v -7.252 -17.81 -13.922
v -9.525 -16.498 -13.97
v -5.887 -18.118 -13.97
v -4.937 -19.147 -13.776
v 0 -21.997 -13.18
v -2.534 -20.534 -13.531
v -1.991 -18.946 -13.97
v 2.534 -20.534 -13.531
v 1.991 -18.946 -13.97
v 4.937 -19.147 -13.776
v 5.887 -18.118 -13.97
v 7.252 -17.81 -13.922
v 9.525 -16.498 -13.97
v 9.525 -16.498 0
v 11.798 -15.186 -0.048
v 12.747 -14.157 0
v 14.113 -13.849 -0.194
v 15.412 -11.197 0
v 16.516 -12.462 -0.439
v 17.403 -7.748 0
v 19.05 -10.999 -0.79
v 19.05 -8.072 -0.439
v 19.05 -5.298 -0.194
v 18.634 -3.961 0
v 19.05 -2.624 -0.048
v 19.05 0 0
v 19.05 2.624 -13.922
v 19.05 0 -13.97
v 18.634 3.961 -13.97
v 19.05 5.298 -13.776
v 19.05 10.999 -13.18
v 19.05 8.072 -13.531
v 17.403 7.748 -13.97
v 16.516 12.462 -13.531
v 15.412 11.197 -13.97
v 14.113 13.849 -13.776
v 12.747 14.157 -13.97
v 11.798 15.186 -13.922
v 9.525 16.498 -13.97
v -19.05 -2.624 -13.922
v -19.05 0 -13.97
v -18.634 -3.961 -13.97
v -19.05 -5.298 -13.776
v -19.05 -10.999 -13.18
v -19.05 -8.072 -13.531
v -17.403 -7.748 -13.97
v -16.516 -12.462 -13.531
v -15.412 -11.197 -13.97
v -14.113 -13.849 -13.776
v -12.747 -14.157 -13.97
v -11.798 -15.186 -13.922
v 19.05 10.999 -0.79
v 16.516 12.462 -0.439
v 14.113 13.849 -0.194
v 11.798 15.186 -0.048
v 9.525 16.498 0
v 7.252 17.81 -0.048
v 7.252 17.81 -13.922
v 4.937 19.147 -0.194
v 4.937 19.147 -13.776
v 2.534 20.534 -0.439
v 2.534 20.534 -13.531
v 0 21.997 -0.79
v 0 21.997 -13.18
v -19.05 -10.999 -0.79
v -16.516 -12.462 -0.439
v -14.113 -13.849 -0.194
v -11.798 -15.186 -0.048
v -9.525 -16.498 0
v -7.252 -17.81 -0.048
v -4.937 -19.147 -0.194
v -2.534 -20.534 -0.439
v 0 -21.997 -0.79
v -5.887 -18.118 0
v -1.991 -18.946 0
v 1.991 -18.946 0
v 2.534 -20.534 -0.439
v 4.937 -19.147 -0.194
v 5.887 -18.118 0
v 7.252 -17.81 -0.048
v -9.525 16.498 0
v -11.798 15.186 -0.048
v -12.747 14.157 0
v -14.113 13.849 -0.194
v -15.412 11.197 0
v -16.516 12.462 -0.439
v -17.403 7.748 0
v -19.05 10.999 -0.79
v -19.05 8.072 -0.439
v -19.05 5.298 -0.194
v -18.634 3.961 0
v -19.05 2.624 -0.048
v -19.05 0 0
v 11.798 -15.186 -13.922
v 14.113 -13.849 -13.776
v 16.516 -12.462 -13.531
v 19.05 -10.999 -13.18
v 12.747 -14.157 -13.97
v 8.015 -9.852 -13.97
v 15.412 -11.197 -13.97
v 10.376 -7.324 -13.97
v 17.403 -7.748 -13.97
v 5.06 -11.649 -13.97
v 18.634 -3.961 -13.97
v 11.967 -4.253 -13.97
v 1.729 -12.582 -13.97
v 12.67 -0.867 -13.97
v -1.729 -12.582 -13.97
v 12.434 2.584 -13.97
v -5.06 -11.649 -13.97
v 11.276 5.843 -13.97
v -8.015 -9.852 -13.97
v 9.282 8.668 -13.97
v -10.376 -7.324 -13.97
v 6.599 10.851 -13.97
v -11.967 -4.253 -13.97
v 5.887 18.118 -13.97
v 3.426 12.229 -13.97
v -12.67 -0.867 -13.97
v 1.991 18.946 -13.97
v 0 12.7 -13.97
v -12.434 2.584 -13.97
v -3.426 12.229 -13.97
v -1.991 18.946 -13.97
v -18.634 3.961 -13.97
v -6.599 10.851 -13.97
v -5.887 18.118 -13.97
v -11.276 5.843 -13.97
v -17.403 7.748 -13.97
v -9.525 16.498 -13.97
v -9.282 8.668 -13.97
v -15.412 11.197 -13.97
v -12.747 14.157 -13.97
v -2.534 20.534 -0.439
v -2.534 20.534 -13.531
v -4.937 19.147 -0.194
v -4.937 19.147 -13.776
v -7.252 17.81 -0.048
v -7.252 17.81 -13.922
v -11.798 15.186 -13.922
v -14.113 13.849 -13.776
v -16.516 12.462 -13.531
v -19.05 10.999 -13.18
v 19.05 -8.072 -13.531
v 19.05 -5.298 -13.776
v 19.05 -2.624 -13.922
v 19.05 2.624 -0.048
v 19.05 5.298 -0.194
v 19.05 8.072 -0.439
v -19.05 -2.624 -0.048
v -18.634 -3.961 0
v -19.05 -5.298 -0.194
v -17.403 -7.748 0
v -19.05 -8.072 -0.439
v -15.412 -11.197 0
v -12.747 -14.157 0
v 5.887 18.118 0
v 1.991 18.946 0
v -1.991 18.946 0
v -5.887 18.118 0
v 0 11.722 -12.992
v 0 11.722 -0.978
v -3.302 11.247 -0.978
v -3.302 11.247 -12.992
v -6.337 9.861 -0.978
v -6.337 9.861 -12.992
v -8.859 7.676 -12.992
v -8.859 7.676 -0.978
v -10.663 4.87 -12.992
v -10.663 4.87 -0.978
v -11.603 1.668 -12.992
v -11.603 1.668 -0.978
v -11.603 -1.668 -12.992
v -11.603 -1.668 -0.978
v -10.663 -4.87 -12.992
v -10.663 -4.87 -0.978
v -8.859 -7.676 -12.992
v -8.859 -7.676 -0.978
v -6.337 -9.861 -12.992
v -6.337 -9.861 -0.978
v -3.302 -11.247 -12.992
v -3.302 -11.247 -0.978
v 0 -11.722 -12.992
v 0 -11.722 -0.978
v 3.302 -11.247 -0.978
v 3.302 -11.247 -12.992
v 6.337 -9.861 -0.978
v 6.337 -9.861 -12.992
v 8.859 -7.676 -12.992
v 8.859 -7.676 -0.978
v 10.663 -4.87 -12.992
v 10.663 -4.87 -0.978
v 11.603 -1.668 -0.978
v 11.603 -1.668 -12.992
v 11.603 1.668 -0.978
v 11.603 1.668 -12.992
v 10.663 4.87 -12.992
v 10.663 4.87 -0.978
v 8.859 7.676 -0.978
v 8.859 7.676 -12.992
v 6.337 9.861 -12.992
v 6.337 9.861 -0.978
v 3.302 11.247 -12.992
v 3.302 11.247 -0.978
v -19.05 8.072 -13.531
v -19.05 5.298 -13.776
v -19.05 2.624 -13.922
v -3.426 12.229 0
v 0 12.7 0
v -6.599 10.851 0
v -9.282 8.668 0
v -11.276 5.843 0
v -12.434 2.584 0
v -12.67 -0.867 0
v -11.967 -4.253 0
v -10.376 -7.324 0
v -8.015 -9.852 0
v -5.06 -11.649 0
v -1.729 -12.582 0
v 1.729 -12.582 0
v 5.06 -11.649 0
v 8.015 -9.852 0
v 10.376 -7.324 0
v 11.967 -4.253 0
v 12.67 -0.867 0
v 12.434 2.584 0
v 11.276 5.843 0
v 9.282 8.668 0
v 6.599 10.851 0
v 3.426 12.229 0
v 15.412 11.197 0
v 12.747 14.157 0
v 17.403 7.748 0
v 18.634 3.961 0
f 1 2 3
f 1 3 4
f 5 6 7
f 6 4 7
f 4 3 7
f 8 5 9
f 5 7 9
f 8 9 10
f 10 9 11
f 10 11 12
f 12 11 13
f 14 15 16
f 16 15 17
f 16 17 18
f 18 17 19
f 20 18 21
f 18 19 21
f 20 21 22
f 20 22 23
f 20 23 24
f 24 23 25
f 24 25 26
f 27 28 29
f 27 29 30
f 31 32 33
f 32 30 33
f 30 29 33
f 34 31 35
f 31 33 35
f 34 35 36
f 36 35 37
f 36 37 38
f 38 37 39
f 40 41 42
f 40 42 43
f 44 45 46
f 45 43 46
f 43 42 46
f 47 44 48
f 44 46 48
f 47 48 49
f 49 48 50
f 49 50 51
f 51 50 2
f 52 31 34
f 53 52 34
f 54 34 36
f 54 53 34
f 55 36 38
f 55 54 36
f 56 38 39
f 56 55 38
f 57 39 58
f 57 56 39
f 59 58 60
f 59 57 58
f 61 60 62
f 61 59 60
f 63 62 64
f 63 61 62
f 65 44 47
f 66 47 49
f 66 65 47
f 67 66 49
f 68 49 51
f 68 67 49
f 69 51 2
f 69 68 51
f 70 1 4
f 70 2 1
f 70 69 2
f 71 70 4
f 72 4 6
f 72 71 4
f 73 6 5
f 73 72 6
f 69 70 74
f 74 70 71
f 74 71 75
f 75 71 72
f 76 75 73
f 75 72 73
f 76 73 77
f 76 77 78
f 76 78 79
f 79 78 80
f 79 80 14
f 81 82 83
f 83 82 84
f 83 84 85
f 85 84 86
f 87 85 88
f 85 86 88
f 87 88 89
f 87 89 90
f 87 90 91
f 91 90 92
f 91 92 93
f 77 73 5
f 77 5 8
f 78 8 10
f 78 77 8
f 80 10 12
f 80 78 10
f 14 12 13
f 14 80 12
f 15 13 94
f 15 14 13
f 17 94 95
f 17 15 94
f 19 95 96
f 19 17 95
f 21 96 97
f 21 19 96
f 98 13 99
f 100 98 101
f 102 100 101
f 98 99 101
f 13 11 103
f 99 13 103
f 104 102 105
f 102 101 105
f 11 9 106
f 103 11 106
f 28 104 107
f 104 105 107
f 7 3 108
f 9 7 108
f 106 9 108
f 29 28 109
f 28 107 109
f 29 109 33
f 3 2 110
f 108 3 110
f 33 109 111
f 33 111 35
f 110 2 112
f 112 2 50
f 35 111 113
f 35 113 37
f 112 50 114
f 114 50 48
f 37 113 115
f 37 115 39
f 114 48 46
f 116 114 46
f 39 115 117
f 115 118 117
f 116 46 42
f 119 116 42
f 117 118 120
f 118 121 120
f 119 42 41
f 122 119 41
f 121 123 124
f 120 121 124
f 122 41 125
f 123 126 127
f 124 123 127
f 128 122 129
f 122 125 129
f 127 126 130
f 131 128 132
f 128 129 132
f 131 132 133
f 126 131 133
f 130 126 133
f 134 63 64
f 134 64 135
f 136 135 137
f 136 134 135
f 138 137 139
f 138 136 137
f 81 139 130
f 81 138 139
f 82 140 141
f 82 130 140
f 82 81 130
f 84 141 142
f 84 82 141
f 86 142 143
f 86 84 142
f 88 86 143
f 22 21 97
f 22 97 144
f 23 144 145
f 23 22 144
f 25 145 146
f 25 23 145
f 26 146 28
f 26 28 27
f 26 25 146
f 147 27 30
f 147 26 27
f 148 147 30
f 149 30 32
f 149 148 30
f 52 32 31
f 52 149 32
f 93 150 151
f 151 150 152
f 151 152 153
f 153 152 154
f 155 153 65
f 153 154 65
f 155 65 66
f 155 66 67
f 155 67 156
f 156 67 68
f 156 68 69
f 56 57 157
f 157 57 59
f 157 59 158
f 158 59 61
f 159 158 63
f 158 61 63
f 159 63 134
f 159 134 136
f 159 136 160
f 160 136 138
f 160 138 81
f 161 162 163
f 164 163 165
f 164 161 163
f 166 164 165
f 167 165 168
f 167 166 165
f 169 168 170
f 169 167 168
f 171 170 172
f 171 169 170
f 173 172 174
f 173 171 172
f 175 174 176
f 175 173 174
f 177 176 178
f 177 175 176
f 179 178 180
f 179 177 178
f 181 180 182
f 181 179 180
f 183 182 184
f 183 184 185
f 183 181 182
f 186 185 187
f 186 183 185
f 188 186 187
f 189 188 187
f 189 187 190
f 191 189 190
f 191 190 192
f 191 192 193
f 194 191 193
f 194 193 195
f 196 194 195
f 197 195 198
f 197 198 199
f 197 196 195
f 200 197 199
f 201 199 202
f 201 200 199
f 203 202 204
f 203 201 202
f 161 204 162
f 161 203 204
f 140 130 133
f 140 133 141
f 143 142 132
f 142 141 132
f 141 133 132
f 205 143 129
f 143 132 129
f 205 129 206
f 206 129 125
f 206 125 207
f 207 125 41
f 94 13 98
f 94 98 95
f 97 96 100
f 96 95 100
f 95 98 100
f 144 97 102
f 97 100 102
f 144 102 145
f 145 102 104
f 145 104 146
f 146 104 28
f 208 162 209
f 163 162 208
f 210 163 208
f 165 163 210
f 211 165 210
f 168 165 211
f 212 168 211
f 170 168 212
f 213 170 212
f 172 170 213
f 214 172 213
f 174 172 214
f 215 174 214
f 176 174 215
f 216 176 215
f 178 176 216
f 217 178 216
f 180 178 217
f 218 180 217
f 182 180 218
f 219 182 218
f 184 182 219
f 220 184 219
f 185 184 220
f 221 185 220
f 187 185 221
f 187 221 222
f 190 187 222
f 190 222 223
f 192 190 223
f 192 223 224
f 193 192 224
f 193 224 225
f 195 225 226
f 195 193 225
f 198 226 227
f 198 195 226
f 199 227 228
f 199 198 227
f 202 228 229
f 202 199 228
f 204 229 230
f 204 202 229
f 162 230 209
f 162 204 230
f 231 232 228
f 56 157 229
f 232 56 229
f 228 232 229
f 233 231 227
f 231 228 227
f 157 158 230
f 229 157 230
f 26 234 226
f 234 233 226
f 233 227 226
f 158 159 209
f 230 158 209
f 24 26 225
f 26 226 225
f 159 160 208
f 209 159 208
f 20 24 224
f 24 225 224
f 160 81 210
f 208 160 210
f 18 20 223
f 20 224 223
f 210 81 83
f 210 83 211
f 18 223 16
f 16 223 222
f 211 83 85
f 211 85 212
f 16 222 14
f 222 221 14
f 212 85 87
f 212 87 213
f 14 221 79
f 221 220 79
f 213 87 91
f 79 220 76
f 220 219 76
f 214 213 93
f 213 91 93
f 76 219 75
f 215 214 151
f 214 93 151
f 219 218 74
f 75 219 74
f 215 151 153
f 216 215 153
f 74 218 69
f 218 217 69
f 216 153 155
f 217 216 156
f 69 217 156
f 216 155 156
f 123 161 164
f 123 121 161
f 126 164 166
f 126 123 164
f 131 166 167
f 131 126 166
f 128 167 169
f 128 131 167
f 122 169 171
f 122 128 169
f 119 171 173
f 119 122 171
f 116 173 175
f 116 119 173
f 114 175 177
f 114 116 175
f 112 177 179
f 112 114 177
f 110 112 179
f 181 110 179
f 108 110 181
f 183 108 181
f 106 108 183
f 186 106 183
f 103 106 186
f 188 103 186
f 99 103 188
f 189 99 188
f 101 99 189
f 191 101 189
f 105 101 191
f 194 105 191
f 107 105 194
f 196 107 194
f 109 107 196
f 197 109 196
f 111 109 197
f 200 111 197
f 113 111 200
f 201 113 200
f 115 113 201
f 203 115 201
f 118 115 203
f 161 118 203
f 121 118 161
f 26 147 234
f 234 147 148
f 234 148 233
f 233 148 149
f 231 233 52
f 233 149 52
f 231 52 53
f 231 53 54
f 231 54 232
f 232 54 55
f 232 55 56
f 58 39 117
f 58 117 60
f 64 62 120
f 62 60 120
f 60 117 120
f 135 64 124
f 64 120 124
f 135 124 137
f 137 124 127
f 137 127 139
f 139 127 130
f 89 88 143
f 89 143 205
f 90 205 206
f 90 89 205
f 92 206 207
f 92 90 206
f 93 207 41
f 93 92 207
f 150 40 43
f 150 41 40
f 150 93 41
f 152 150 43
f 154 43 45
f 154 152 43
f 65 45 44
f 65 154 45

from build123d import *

# Parameters (mm, degrees)
SKETCH2_W          = 76.2
SKETCH2_H          = 76.2
CUT_EXTRUDE1_DEPTH = 13.97


with BuildPart() as part:
    # Sketch1 → Revolve1 (revolve)
    with BuildSketch(Plane(origin=(0, 0, 0), x_dir=(0, 0, -1), z_dir=(1, 0, 0))):
        Polygon((0, 0), (0, 19.05), (1.020886423, 22.86), (12.949113577, 22.86), (13.97, 19.05), (13.97, 0), align=None)
    revolve(axis=Axis((0, 0, -13.97), (0, 0, 1)))

    # Sketch2 → Cut-Extrude1 (cut)
    with BuildSketch(Plane.XY):
        Rectangle(SKETCH2_W, SKETCH2_H)
        Polygon((-19.05, 10.998522628), (-19.05, -10.998522628), (0, -21.997045256), (19.05, -10.998522628), (19.05, 10.998522628), (0, 21.997045256), align=None, mode=Mode.SUBTRACT)
    extrude(amount=-CUT_EXTRUDE1_DEPTH, mode=Mode.SUBTRACT)

    # Sketch3 → Cut-Revolve1 (revolve, cut)
    with BuildSketch(Plane(origin=(0, 0, 0), x_dir=(0, 0, -1), z_dir=(1, 0, 0))):
        Polygon((0, 0), (0, 12.7), (0.9779, 11.7221), (12.9921, 11.7221), (13.97, 12.7), (13.97, 0), align=None)
    revolve(axis=Axis((0, 0, -13.97), (0, 0, 1)), mode=Mode.SUBTRACT)


solid = part.part
